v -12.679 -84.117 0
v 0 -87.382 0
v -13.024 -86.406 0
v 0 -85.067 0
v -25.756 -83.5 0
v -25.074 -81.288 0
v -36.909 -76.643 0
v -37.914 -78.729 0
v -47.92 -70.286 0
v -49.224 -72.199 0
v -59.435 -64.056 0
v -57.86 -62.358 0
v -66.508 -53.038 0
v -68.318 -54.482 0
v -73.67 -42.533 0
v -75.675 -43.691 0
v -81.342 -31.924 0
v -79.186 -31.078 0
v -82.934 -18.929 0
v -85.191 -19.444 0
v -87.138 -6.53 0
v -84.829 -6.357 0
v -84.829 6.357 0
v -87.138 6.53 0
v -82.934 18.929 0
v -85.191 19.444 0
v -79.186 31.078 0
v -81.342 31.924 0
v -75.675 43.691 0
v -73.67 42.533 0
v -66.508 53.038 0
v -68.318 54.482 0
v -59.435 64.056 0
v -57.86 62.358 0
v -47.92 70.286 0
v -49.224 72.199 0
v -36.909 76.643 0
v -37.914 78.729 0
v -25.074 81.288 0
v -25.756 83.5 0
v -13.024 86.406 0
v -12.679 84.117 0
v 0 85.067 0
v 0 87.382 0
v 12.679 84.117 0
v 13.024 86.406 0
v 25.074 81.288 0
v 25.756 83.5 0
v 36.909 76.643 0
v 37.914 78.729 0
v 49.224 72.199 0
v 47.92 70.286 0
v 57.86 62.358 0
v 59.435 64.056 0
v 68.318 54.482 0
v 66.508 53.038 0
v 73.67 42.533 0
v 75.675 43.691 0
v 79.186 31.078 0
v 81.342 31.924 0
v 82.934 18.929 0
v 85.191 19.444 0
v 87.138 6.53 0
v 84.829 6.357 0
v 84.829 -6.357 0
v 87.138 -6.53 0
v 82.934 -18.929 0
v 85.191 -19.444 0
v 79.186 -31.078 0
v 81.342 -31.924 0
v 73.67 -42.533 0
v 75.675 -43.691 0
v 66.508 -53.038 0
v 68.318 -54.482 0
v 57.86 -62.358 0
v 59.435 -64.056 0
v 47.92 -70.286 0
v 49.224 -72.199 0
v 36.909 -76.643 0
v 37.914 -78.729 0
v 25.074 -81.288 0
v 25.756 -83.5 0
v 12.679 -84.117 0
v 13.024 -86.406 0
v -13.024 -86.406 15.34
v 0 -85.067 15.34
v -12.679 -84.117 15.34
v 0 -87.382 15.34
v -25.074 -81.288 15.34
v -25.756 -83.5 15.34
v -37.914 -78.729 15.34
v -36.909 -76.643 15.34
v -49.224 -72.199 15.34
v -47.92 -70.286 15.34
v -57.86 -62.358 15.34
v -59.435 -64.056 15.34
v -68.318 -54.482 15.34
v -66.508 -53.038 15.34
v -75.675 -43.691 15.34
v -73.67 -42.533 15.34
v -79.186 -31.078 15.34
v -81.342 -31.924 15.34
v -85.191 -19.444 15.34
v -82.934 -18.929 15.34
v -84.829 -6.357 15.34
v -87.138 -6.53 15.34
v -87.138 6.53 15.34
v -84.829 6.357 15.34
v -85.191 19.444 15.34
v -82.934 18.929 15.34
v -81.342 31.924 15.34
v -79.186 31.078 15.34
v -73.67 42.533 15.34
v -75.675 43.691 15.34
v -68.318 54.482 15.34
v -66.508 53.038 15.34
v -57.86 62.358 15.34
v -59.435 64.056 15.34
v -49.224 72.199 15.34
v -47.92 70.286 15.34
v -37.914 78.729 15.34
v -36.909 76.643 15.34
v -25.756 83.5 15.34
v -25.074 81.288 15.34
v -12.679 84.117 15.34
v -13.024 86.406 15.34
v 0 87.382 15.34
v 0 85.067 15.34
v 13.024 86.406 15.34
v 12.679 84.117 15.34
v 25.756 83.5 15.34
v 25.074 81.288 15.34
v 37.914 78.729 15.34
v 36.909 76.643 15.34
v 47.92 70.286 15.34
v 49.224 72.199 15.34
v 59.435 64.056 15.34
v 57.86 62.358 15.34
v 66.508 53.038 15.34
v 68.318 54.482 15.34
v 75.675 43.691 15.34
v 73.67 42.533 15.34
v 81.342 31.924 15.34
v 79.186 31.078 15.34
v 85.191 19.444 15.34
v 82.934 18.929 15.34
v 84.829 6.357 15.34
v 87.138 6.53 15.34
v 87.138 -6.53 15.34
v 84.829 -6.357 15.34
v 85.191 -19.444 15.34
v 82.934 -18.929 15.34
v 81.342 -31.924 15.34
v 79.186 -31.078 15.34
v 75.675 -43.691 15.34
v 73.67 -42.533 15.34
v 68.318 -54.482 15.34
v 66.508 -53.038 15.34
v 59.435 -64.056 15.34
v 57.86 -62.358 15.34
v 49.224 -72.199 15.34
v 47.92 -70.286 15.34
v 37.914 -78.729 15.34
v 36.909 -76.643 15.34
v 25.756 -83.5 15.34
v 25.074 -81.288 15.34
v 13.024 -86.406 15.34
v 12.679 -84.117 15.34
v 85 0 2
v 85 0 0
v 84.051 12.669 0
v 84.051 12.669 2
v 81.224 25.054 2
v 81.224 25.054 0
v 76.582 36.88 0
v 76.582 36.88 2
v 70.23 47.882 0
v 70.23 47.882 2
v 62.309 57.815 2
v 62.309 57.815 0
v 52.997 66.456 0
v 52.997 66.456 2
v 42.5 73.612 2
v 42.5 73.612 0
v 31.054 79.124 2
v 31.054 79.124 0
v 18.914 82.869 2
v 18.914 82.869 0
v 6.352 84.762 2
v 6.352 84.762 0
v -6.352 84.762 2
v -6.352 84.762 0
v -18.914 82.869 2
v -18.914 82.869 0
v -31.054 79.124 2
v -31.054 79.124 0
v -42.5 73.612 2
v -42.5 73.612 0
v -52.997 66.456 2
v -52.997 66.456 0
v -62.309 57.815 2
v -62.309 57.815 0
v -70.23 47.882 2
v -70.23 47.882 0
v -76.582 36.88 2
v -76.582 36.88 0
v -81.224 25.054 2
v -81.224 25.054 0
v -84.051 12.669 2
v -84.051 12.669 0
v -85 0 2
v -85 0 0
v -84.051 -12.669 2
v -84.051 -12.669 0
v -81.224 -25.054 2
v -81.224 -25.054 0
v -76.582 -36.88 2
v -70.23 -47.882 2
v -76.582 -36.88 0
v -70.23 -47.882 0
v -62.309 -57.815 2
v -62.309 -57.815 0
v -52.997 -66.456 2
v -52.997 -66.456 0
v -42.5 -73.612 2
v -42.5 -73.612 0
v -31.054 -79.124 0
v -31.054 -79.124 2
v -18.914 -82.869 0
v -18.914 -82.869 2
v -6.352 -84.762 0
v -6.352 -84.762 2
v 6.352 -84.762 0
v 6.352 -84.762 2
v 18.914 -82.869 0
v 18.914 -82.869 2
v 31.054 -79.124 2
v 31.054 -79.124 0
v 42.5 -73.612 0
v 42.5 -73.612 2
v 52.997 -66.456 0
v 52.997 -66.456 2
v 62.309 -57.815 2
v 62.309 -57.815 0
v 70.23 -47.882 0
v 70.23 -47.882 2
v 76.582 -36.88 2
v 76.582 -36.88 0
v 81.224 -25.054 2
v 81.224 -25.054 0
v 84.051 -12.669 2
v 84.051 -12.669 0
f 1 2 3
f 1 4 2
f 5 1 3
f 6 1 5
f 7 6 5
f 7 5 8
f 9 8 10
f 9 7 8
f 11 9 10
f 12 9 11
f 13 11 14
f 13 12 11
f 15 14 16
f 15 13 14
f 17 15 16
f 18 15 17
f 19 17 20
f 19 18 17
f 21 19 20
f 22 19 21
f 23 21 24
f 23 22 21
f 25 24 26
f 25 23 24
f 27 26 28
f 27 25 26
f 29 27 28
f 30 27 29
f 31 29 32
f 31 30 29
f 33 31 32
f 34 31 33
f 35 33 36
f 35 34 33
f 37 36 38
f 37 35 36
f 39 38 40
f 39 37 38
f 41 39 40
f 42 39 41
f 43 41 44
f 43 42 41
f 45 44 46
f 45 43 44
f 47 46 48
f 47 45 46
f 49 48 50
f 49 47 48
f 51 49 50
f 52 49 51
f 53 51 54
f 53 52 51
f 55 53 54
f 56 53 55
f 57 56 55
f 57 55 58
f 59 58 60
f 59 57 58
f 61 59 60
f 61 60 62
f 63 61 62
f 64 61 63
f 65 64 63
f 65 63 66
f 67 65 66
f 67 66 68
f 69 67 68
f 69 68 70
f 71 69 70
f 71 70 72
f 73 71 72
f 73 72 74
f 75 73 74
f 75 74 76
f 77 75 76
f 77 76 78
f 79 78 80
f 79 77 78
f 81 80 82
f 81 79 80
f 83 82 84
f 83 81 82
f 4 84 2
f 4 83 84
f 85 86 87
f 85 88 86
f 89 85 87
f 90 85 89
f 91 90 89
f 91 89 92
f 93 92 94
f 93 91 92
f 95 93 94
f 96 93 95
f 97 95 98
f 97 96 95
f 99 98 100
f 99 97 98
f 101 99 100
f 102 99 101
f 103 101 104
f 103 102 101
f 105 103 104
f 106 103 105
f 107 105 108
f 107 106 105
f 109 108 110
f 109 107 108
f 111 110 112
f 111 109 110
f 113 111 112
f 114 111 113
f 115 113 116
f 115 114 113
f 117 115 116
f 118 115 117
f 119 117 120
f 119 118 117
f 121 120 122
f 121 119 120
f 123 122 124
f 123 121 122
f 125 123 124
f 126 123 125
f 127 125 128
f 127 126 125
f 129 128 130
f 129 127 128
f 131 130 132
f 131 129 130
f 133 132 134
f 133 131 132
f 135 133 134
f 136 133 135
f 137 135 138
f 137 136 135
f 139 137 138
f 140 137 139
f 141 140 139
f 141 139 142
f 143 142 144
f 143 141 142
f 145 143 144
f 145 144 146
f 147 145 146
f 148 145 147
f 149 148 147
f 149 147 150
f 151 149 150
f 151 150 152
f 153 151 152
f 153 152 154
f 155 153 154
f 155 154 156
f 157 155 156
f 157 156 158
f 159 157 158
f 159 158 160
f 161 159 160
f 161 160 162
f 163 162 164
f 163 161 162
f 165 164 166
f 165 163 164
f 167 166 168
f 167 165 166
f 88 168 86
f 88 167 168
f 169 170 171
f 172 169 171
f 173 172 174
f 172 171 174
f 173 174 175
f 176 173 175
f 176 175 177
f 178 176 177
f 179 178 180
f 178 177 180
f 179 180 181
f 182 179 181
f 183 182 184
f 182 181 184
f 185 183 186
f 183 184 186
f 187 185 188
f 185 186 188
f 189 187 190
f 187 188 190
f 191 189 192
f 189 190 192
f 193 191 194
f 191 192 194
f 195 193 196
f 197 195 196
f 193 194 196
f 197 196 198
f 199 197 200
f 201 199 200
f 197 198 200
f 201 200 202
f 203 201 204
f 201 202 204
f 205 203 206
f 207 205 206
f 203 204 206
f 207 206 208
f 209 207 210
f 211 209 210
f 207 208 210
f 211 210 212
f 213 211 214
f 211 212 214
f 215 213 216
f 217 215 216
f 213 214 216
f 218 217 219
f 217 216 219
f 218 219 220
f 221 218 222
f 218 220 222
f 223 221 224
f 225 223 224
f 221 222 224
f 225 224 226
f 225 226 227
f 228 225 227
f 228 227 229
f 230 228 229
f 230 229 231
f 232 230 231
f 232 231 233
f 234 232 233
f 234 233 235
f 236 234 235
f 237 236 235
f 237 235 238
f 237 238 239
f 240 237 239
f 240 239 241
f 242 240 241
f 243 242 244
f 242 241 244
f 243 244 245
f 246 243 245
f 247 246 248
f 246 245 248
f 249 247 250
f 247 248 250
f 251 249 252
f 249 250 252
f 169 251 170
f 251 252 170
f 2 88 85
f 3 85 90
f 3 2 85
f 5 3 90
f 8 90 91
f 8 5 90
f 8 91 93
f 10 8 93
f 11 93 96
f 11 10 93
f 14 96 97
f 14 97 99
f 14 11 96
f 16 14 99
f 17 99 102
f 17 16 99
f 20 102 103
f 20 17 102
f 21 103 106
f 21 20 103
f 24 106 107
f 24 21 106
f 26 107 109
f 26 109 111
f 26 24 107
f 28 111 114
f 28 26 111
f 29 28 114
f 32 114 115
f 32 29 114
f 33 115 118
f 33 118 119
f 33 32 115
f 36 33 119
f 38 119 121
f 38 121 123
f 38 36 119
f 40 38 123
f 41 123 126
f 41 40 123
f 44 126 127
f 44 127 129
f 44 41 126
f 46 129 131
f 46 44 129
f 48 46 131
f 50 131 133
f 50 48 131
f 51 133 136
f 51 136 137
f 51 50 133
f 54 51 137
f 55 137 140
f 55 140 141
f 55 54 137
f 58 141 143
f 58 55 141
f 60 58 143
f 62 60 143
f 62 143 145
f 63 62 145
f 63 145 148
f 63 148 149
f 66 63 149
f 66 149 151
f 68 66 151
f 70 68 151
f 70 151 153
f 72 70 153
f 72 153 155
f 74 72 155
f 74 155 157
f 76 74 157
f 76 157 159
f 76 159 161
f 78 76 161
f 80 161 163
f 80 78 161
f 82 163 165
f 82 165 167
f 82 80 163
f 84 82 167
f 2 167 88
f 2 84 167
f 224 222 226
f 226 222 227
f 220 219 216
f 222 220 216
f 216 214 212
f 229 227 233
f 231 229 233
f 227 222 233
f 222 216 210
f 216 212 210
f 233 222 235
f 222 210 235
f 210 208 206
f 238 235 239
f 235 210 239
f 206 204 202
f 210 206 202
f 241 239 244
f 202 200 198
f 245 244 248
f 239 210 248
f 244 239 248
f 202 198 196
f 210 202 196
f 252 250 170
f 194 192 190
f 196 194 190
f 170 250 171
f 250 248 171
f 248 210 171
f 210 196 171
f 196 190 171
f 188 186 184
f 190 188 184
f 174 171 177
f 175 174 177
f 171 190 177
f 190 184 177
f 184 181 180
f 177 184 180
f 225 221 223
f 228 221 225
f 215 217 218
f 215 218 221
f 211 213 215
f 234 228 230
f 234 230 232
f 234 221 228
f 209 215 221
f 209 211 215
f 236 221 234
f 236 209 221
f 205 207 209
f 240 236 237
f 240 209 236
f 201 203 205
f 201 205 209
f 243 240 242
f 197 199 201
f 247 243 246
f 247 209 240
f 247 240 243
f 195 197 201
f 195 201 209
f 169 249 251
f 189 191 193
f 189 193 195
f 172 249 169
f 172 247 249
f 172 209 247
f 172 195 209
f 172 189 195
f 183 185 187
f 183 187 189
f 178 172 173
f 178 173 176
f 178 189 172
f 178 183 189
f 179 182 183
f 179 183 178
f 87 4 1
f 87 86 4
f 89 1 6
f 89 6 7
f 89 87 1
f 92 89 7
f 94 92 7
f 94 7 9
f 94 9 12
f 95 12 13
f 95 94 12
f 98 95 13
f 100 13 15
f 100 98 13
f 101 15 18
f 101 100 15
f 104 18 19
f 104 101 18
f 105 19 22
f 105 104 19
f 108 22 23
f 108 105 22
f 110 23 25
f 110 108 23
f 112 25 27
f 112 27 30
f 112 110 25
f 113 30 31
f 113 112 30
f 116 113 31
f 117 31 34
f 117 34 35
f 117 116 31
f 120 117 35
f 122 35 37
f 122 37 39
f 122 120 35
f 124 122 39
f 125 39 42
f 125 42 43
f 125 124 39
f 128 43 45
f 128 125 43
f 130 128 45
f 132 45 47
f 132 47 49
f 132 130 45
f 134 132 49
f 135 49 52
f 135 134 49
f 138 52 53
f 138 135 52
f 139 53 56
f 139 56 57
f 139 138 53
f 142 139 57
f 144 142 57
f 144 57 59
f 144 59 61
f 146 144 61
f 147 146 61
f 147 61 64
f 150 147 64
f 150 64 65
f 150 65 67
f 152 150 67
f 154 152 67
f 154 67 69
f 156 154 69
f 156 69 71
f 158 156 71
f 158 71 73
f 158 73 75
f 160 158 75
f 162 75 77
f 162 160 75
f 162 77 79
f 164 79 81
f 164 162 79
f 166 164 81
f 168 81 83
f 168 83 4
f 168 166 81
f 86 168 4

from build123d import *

# Parameters (mm, degrees)
F0_R     = 85
F1_DEPTH = 2
F2_W     = 2.3153945804
F2_H     = 15.3396707028


with BuildPart() as f1:
    # F0 (on Top) → F1 (new body)
    with BuildSketch(Plane.XY):
        Circle(F0_R)
    extrude(amount=F1_DEPTH)


with BuildPart() as f3:
    # F3: sweep along a path in F3_path
    with BuildLine(Plane(origin=(85, 0, 2), x_dir=(0, -1, 0), z_dir=(0, 0, -1))) as f3_path:
        CenterArc((0, 85), 85, 0, 360)
    # F2 (on Right) → F3 (sweep)
    with BuildSketch(Plane.YZ):
        with Locations((-86.2245298922, 7.6698353514)):
            Rectangle(F2_W, F2_H)
    sweep(path=f3_path.line)


solid = Compound([f1.part, f3.part])
